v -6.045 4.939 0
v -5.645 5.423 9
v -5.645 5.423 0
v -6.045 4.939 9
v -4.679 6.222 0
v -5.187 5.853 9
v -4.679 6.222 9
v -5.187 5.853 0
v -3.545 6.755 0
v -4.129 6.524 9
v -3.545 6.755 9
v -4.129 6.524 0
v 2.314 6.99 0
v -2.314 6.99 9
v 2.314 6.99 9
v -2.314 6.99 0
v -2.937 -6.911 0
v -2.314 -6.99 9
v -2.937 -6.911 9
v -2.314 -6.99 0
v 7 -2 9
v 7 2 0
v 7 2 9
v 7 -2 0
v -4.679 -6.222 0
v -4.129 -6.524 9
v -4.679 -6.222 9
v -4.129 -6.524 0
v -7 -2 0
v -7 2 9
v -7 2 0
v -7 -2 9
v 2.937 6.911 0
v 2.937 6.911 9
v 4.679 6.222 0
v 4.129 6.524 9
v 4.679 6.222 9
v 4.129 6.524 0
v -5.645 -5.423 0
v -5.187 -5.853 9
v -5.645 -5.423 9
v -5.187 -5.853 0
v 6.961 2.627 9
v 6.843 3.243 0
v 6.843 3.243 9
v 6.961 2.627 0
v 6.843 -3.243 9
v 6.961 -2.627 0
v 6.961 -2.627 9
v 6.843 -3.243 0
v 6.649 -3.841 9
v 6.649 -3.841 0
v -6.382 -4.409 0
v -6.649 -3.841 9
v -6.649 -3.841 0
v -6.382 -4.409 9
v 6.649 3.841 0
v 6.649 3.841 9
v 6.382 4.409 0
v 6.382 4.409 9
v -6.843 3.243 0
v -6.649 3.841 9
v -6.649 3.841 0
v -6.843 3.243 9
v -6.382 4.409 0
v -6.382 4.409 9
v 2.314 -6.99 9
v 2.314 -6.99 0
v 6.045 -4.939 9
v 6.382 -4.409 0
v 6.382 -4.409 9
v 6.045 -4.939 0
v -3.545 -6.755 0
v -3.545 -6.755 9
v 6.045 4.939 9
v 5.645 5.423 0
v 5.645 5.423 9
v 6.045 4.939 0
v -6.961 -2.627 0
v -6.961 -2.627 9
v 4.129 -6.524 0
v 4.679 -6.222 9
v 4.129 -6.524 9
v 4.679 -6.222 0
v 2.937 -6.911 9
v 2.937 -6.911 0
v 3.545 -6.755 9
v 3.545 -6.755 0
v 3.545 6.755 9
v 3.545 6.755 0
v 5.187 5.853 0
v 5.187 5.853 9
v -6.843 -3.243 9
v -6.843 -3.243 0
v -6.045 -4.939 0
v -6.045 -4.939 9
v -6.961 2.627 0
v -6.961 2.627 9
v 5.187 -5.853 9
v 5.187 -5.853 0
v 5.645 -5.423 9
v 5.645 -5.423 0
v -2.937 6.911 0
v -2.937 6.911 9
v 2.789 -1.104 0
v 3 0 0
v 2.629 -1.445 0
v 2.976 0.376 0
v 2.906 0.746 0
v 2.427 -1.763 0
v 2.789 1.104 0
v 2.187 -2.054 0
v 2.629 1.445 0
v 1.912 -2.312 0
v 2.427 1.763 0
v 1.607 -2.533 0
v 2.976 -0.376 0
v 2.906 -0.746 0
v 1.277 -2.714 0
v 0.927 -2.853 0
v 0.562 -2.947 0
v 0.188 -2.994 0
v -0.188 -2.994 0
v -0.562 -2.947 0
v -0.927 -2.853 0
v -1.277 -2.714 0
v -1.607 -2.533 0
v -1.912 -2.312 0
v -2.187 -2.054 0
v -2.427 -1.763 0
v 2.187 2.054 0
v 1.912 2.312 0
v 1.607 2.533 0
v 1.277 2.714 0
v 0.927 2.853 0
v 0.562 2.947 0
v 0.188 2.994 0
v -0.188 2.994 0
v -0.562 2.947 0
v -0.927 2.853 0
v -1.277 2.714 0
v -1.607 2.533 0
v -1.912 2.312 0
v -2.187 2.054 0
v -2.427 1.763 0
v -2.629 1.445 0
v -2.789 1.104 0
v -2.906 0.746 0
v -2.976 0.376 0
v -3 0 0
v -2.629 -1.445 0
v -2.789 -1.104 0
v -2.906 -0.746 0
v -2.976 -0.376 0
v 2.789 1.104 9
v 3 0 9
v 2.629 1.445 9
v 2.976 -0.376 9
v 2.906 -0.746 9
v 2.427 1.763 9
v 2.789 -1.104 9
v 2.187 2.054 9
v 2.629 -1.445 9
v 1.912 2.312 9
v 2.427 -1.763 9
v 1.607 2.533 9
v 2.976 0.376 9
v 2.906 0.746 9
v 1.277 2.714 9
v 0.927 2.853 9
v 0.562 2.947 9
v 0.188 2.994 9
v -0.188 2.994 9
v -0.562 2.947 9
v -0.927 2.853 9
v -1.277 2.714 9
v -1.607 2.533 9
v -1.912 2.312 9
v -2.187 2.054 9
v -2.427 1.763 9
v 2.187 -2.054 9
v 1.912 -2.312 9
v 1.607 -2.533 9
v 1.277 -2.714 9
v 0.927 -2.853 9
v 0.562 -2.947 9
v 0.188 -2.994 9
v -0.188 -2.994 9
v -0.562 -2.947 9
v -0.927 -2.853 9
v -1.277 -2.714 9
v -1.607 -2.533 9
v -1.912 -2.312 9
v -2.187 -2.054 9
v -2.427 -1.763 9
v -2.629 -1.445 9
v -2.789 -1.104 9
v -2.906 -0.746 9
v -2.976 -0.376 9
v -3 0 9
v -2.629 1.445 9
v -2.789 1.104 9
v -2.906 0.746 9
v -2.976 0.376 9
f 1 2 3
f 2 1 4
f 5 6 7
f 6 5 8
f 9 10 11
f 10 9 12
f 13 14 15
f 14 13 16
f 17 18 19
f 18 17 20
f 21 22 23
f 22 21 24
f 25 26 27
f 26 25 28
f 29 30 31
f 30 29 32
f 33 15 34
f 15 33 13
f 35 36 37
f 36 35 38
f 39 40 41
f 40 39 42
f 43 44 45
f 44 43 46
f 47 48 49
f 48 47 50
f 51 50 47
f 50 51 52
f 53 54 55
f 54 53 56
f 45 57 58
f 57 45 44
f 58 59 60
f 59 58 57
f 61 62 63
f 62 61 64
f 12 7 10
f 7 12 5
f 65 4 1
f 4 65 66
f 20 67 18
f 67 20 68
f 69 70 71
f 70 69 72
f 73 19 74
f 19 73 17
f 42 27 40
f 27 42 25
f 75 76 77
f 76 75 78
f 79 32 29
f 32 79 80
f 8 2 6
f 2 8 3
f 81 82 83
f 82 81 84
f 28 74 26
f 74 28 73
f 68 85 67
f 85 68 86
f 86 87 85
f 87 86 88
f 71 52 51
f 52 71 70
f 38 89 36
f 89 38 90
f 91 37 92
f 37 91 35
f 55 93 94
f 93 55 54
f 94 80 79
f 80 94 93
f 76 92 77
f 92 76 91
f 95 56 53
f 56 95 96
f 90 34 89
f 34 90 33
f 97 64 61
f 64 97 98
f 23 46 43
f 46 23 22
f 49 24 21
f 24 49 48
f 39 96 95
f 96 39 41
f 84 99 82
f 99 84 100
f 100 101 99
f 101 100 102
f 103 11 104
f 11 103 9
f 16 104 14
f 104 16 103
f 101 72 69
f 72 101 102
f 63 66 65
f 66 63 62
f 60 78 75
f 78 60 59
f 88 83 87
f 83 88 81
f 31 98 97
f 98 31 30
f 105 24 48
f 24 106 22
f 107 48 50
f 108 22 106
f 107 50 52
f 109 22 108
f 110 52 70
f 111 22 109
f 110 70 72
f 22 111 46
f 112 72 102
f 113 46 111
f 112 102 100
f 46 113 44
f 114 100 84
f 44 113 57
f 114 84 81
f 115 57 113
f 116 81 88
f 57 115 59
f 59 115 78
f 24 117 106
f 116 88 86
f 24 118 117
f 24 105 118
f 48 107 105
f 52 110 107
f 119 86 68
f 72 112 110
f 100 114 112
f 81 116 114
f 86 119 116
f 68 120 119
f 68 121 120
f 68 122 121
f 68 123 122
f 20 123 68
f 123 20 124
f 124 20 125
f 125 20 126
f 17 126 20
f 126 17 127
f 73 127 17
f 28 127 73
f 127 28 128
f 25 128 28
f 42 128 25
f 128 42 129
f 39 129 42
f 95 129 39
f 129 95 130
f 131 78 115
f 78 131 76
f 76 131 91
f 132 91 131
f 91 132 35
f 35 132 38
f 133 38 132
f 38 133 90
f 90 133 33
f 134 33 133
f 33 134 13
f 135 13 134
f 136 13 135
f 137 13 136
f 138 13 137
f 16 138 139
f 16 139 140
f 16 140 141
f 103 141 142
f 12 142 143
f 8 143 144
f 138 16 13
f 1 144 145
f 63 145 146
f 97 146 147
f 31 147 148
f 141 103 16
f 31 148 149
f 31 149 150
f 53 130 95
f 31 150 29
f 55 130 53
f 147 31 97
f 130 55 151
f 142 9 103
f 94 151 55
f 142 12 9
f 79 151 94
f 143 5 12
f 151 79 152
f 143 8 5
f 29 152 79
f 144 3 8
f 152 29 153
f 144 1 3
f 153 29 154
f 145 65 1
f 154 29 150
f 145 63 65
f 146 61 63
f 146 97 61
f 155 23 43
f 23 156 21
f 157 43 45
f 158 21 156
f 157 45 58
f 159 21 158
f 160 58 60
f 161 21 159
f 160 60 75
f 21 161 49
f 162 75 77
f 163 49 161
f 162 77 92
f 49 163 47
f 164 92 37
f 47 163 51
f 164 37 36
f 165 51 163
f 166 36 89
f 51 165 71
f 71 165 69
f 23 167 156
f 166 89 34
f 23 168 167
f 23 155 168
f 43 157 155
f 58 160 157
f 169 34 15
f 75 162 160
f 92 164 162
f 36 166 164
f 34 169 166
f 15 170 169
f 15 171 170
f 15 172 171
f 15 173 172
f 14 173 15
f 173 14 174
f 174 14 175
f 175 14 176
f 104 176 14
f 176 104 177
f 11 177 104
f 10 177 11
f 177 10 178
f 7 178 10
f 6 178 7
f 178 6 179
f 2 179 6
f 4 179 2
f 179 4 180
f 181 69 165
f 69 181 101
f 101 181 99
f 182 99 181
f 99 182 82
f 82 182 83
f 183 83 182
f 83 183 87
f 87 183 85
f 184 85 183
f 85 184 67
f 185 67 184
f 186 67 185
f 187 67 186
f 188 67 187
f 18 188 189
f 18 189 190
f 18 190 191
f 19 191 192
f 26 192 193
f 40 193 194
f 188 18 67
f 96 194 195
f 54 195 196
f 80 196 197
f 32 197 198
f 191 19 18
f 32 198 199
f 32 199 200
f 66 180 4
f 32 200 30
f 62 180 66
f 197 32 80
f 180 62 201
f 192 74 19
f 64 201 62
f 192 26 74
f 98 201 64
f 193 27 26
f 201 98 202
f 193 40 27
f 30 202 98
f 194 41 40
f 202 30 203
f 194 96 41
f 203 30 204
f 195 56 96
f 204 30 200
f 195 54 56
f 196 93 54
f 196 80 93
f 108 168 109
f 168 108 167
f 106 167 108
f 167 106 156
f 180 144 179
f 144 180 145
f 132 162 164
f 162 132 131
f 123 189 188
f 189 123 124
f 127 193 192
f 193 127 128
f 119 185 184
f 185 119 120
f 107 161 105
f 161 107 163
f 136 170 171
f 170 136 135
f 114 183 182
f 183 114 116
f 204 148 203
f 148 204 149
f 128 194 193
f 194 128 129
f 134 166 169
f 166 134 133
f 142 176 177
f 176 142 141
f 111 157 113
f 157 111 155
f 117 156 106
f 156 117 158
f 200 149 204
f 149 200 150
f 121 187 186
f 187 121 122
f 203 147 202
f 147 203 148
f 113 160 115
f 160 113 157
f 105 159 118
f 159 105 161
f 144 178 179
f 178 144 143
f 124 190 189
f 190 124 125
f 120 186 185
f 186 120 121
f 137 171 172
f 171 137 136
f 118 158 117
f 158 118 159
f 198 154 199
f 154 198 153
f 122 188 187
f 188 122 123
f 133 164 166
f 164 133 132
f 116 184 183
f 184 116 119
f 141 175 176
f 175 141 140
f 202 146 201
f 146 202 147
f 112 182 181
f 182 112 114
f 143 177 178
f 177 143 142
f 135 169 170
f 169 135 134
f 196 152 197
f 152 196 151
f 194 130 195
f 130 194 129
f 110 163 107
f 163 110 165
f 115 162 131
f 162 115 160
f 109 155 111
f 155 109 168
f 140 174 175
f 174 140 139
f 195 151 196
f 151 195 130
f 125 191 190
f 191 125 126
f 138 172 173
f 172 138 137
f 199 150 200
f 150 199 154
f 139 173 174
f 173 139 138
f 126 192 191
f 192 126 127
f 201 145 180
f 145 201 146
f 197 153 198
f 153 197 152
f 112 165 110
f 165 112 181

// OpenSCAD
// Generated by SolidPython 1.1.3 on 2023-03-12 22:43:53
$fn = 50;


difference() {
	union() {
		translate(v = [0, 0, 0]) {
			rotate(a = [0, 0, 0]) {
				hull() {
					translate(v = [-2.0000000000, 2.0000000000, 0]) {
						rotate(a = [0, 0, 0]) {
							translate(v = [0, 0, 0]) {
								rotate(a = [0, 0, 0]) {
									cylinder(h = 9, r = 5);
								}
							}
						}
					}
					translate(v = [2.0000000000, 2.0000000000, 0]) {
						rotate(a = [0, 0, 0]) {
							translate(v = [0, 0, 0]) {
								rotate(a = [0, 0, 0]) {
									cylinder(h = 9, r = 5);
								}
							}
						}
					}
					translate(v = [-2.0000000000, -2.0000000000, 0]) {
						rotate(a = [0, 0, 0]) {
							translate(v = [0, 0, 0]) {
								rotate(a = [0, 0, 0]) {
									cylinder(h = 9, r = 5);
								}
							}
						}
					}
					translate(v = [2.0000000000, -2.0000000000, 0]) {
						rotate(a = [0, 0, 0]) {
							translate(v = [0, 0, 0]) {
								rotate(a = [0, 0, 0]) {
									cylinder(h = 9, r = 5);
								}
							}
						}
					}
				}
			}
		}
	}
	union() {
		translate(v = [0.0000000000, 0.0000000000, 0]) {
			rotate(a = [0, 0, 0]) {
				translate(v = [0, 0, -50]) {
					rotate(a = [0, 0, 0]) {
						cylinder(h = 100, r = 3.0000000000);
					}
				}
			}
		}
	}
}
/***********************************************
*********      SolidPython code:      **********
************************************************
 
from solid import *
import os
import subprocess

import oomB

import opsc_library_gen

mode = "laser"
#mode = "3d_print"

defined_objects = {}

radius_dict = {}
countersunk_dict = {}


def set_mode(m):
    global mode
    mode = m
    radius_dict['M6'] = 6.5/2
    radius_dict['M3'] = 3.3/2
    if mode == "laser":
        radius_dict['M6'] = 6/2
        radius_dict['M3'] = 3/2

    countersunk_dict['M3'] = {}
    countersunk_dict['M3']['little_rad'] = radius_dict['M3']
    countersunk_dict['M3']['big_rad'] = (5.5+0.6)/2
    if mode == "laser":
        countersunk_dict['M3']['big_rad'] = (4.75+0.6)/2
        countersunk_dict['M3']['little_rad'] = (4.75+0.6)/2

    countersunk_dict['M3']['height'] = 1.7


def opsc_make_object(filename, objects, save_type="none",resolution=50, layers = 1, tilediff = 200, mode="laser", overwrite=True):
    if overwrite or not os.path.exists(filename):
        set_mode(mode)
        save_type = save_type.lower()
        os.makedirs(os.path.dirname(filename), exist_ok=True)
        final_object = opsc_get_object(objects, mode = mode)
        # Save the final object to the specified filename    
        scad_render_to_file(final_object, filename, file_header='$fn = %s;' % resolution, include_orig_code=True)
        if mode == "laser":
            filename_laser = filename.replace(".scad","-flat.scad")
            scad_render_to_file(getLaser(final_object, layers=layers, tilediff=tilediff), filename_laser, file_header='$fn = %s;' % resolution, include_orig_code=True)
            if save_type == "all":
                saveToAll(filename_laser)
            elif save_type == "dxf":
                saveToDxf(filename_laser)
        if save_type == "all":
            saveToAll(filename)
        elif save_type == "dxf":
            saveToDxf(filename)


def opsc_get_object(objects, mode = "laser"):
    # Create the solidpython objects only include the positive objects and if they don't have inclusion or their inclusion is either all or mode
    # Initialize an empty list to store the results
    positive_objects = []

    # Iterate over the "objects" list
    for obj in objects:
        # Check if the current object has a "type" key with a value of "positive"
        if obj['type'] == 'positive':
            # Check if the current object has an "inclusion" key and its value matches "mode",
            # or if the current object does not have an "inclusion" key at all
            if not 'inclusion' in obj or obj['inclusion'] == "all" or obj['inclusion'] == mode:
                # Call the "get_opsc_item" function with the current object as an argument
                opsc_item = get_opsc_item(obj)
                # Add the result to the "positive_objects" list
                positive_objects.append(opsc_item)
# Initialize an empty list to store the results
    negative_objects = []

    # Iterate over the "objects" list
    for obj in objects:
        # Check if the current object has a "type" key with a value of "negative"
        if obj['type'] == 'negative':
            # Check if the current object has an "inclusion" key and its value matches "mode",
            # or if the current object does not have an "inclusion" key at all
            if not 'inclusion' in obj or obj['inclusion'] == "all" or obj['inclusion'] == mode:
                # Call the "get_opsc_item" function with the current object as an argument
                opsc_item = get_opsc_item(obj)
                # Add the result to the "negative_objects" list
                negative_objects.append(opsc_item)
    
    #positive_objects = [get_opsc_item(obj) for obj in objects if obj['type'] == 'positive']
    #negative_objects = [get_opsc_item(obj) for obj in objects if obj['type'] == 'negative']
    # Union the positive objects
    positive_object = union()(*positive_objects)
    # Union the negative objects
    negative_object = union()(*negative_objects)
    # Create the final object by subtracting the negative objects from the positive objects
    return difference()(positive_object, negative_object)

def get_opsc_item(params):
    # A dictionary to map radius string values to numerical values
    #radius_dict = {'small': 5, 'medium': 10, 'large': 15}
    # An array of function names for basic shapes
    basic_shapes = ['cube', 'sphere', 'cylinder']
    
    # An array of function names for other shapes
    other_shapes = ['hole', 'slot', 'rounded_rectangle', 'countersunk']
    


    # Convert radius to r if present, and remove radius from the params dictionary
    if 'radius' in params:
        if isinstance(params['radius'], str):
            # Use the radius_dict to map the radius string value to a numerical value
            params['r'] = radius_dict[params['radius']]
        else:
            params['r'] = params['radius']
        del params['radius']
    

    # Check if the object type is a basic shape
    if params['shape'] in basic_shapes:
        # Remove shape and unexpected dictionary values
        allowed_keys = {'size', 'r', 'r1', 'r2', 'd', 'h', 'rw', 'rh', 'dw', 'dh'}
        shape_params = {k: v for k, v in params.items() if k in allowed_keys}

        # Call the corresponding function for the shape parameter, using ** notation to pass the shape_params dictionary as keyword arguments
        return get_opsc_transform(params,globals()[params['shape']](**shape_params))
    
    # If the object type is not a basic shape, check if it's a defined object or one of the other shapes
    elif params['shape'] in other_shapes:
        # Call the corresponding function for the shape parameter, passing the params dictionary as an argument
        p2 = copy.deepcopy(params)
        p2["pos"] = [0,0,0]
        return get_opsc_transform(params,globals()[params['shape']](p2))
    
    # If the object is not a basic shape or a defined object, try to import it from a .scad file
    else:
        obj = defined_objects[params['shape']]
        return get_opsc_transform(params,obj)

def get_opsc_transform(params, solid_obj):
    # Rotate the object based on the 'rot' field in the params dictionary, or the 'rotX', 'rotY', and 'rotZ' fields if 'rot' is not present
    rot = params.get('rot', [])
    if rot:
        rotX, rotY, rotZ = rot
    else:
        rotX = params.get('rotX', 0)
        rotY = params.get('rotY', 0)
        rotZ = params.get('rotZ', 0)
    solid_obj = rotate([rotX, rotY, rotZ])(solid_obj)

    # Translate the object based on the 'pos' field in the params dictionary, or the 'x', 'y', and 'z' fields if 'pos' is not present
    pos = params.get('pos', [])
    if pos:
        x, y, z = pos
    else:
        x = params.get('x', 0)
        y = params.get('y', 0)
        z = params.get('z', 0)
    solid_obj = translate([x, y, z])(solid_obj)
    return solid_obj


import random

def opsc_easy_array(type, shape, repeats, pos_start, shift_arr, **kwargs):
    for i in range(0,3):
        repeats.append(1)
        pos_start.append(0)
        shift_arr.append(0)
    return_objects = []

    for x in range(0,repeats[0]):
        for y in range(0,repeats[1]):
            for z in range(0,repeats[2]):
                return_objects.append(opsc_easy(type, shape, pos=[pos_start[0]+x*shift_arr[0],pos_start[1]+y*shift_arr[1],pos_start[2]+z*shift_arr[2]], **kwargs))
    return return_objects                



def opsc_easy(type, shape, **kwargs):
    obj = {
        'type': type,
        'shape': shape
    }
    for param in ['size', 'r', 'r1', 'r2', 'd', 'h', 'rw', 'rh', 'dw', 'dh', 'pos', 'x', 'y', 'z', 'rot', 'rotX', 'rotY', 'rotZ', "w", "inclusion"]:
        if param in kwargs:
            obj[param] = kwargs[param]
    return obj

def hole(params):
    p2 = copy.deepcopy(params)  
    # Check if the radius is a string and replace it with the corresponding value from the dictionary
    if isinstance(p2['r'], str):
        p2['r'] = radius_dict[p2['r']]
    
    # Set the height to 100 if not specified
    if 'h' not in p2:
        p2['h'] = 100
        p2["pos"] = [0,0,-50]
    p2["center"] = True
    # Create the cylinder object
    p2["shape"] = "cylinder"
    p2["type"] = "positive"

    return get_opsc_item(p2)

import copy

def countersunk(params):
    p2 = copy.deepcopy(params)
    counter_rad = p2['r']
    p2['r'] = radius_dict[p2['r']]
    hp = copy.deepcopy(p2)
    hp["type"] = "positive"
    hp["shape"] = "hole"
    del hp["rot"]
    hol = get_opsc_item(hp)
    
    cp = copy.deepcopy(p2)
    cp["h"] = countersunk_dict[counter_rad]["height"]
    cp["r2"] = countersunk_dict[counter_rad]["little_rad"]
    cp["r1"] = countersunk_dict[counter_rad]["big_rad"]
    del cp["r"]
    del cp["rot"]
    cp["type"] = "positive"
    cp["shape"] = "cylinder"
    cp["pos"] = [0,0,0]

    top = get_opsc_item(cp)
    return union()(hol,top)



def slot(params):  
    p2 = copy.deepcopy(params) 
    if isinstance(p2['r'], str):
        p2['r'] = radius_dict[p2['r']]
    p2["type"] = "positive"
    p2["shape"] = "hole"
    del p2["rot"]
    p2["pos"] = [0,0,0]
    left = copy.deepcopy(p2)
    right = copy.deepcopy(p2)
    left["pos"][0] = p2["w"] / 2 - p2["r"] 
    
    right["pos"][0] = -p2["w"] / 2 + p2["r"] 
    pass
    leftObj = get_opsc_item(left)
    rightObj = get_opsc_item(right)
    return hull()(leftObj, rightObj)

def rounded_rectangle(params):   
    p2 = copy.deepcopy(params) 
    p2["h"] = p2["size"][2]
    p2["pos"] = p2.get("pos", [0, 0, 0]) 
    p2["type"] = "positive"
    p2["shape"] = "hole"
    p2["pos"] = [0,0,0]
    
    if 'rot' in p2:
        del p2["rot"]   
    if 'r' not in p2:
        p2["r"] = 5 
    tl = copy.deepcopy(p2)
    tr = copy.deepcopy(p2)
    bl = copy.deepcopy(p2)
    br = copy.deepcopy(p2)
    tl["pos"][0] = -(p2["size"][0] - p2["r"]*2)/2
    tl["pos"][1] = (p2["size"][1] - p2["r"]*2)/2
    tr["pos"][0] = (p2["size"][0] - p2["r"]*2)/2
    tr["pos"][1] = (p2["size"][1] - p2["r"]*2)/2
    bl["pos"][0] = -(p2["size"][0] - p2["r"]*2)/2
    bl["pos"][1] = -(p2["size"][1] - p2["r"]*2)/2
    br["pos"][0] = (p2["size"][0] - p2["r"]*2)/2
    br["pos"][1] = -(p2["size"][1] - p2["r"]*2)/2
    del tl["size"]
    del tr["size"]
    del bl["size"]
    del br["size"]
    tlo = get_opsc_item(tl)
    tro = get_opsc_item(tr)
    blo = get_opsc_item(bl)
    bro = get_opsc_item(br)    
    return hull()(tlo, tro, blo, bro)



def import_scad_object(filename):
    # Import the .scad file and convert it to a solidpython object
    #filename = "parts"
    obj = import_scad(filename)
    return obj.main()
    


import os
import solid as solidpython

# A dictionary to store the defined objects


def load_scad_objects():
    opsc_library_gen.gen_library(defined_objects)

import random

def test(num_objects):
    objects = []
    for i in range(num_objects):
        # Choose a random shape
        #shape = random.choice(['cube', 'sphere', 'cylinder', 'hole', 'slot', "rounded_rectangle"])
        shape = random.choice(["rounded_rectangle"])

        # Choose a random type
        type = random.choice(['positive', 'negative'])
        
        # Create an empty object dictionary
        obj = {'shape': shape, 'type': type}
        
        # Set shape-specific parameters
        if obj['shape'] in ['cube']:
            obj['size'] =  [random.uniform(5, 15), random.uniform(5, 15), random.uniform(5, 15)]
        if obj['shape'] in ['rounded_rectangle']:
            obj['size'] =  [random.uniform(5, 15), random.uniform(5, 15), random.uniform(5, 15)]
            obj['r'] = random.uniform(0.5, 5)
        elif obj['shape'] == 'sphere':
            obj['r'] = random.uniform(5, 15)
        elif obj['shape'] in ['cylinder', 'hole']:
            obj['r'] = random.uniform(0.5, 5)
            obj['h'] = random.uniform(5, 15)
        elif obj['shape'] == 'slot':
            obj['r'] = random.uniform(0.5, 5)
            obj['h'] = random.uniform(5, 15)
            obj['w'] = random.uniform(5, 15)
        
        # Set a random position and rotation
        obj['pos'] = [random.uniform(-20, 20), random.uniform(-20, 20), random.uniform(-20, 20)]
        obj['rot'] = [random.uniform(-180, 180), random.uniform(-180, 180), random.uniform(-180, 180)]
        
        # Add the object to the list
        objects.append(obj)
    return objects

####### old file saving
def saveToAll(fileIn):
    saveToDxf(fileIn)
    saveToPng(fileIn)
    saveToStl(fileIn)
    saveToSvg(fileIn)

def saveToDxf(fileIn, fileOut="", copy_to_laser=True):
    if fileOut == "":
        fileOut = fileIn.replace(".scad",".dxf")
    saveToFile(fileIn, fileOut)


    
def saveToPng(fileIn, fileOut="",extra="--render"):
    if fileOut == "":
        fileOut = fileIn.replace(".scad",".png")
    saveToFile(fileIn, fileOut)

def saveToStl(fileIn, fileOut=""):
    if fileOut == "":
        fileOut = fileIn.replace(".scad",".stl")
    saveToFile(fileIn, fileOut)
    
def saveToSvg(fileIn, fileOut=""):
    if fileOut == "":
        fileOut = fileIn.replace(".scad",".svg")
    saveToFile(fileIn, fileOut)

def saveToFile(fileIn, fileOut,extra=""):
    #extra = extra + " --colorscheme Tomorrow"

    launchStr = 'openscad -o "' + fileOut + '"' + extra + ' "' + fileIn + '"'
    if ".png" in fileOut:
        launchStr = launchStr + " --render"
    print("            saveToFile launch string: " + launchStr)
    subprocess.run(launchStr)
    x=0

def getLaser(final_object,start=1.5,layers=1,thickness=3,tilediff=200):
        rv= []

        for x in range(layers):
            rv.append(translate([0,x*tilediff,0])(
                    projection()(
                        intersection()(translate([-500,-500,start+x*thickness])(cube(size=[1000,1000,0.1])),
                            final_object
                        )
                    )
            )
            )
            
        return union()(rv)

set_mode("laser")
load_scad_objects() 
 
************************************************/
